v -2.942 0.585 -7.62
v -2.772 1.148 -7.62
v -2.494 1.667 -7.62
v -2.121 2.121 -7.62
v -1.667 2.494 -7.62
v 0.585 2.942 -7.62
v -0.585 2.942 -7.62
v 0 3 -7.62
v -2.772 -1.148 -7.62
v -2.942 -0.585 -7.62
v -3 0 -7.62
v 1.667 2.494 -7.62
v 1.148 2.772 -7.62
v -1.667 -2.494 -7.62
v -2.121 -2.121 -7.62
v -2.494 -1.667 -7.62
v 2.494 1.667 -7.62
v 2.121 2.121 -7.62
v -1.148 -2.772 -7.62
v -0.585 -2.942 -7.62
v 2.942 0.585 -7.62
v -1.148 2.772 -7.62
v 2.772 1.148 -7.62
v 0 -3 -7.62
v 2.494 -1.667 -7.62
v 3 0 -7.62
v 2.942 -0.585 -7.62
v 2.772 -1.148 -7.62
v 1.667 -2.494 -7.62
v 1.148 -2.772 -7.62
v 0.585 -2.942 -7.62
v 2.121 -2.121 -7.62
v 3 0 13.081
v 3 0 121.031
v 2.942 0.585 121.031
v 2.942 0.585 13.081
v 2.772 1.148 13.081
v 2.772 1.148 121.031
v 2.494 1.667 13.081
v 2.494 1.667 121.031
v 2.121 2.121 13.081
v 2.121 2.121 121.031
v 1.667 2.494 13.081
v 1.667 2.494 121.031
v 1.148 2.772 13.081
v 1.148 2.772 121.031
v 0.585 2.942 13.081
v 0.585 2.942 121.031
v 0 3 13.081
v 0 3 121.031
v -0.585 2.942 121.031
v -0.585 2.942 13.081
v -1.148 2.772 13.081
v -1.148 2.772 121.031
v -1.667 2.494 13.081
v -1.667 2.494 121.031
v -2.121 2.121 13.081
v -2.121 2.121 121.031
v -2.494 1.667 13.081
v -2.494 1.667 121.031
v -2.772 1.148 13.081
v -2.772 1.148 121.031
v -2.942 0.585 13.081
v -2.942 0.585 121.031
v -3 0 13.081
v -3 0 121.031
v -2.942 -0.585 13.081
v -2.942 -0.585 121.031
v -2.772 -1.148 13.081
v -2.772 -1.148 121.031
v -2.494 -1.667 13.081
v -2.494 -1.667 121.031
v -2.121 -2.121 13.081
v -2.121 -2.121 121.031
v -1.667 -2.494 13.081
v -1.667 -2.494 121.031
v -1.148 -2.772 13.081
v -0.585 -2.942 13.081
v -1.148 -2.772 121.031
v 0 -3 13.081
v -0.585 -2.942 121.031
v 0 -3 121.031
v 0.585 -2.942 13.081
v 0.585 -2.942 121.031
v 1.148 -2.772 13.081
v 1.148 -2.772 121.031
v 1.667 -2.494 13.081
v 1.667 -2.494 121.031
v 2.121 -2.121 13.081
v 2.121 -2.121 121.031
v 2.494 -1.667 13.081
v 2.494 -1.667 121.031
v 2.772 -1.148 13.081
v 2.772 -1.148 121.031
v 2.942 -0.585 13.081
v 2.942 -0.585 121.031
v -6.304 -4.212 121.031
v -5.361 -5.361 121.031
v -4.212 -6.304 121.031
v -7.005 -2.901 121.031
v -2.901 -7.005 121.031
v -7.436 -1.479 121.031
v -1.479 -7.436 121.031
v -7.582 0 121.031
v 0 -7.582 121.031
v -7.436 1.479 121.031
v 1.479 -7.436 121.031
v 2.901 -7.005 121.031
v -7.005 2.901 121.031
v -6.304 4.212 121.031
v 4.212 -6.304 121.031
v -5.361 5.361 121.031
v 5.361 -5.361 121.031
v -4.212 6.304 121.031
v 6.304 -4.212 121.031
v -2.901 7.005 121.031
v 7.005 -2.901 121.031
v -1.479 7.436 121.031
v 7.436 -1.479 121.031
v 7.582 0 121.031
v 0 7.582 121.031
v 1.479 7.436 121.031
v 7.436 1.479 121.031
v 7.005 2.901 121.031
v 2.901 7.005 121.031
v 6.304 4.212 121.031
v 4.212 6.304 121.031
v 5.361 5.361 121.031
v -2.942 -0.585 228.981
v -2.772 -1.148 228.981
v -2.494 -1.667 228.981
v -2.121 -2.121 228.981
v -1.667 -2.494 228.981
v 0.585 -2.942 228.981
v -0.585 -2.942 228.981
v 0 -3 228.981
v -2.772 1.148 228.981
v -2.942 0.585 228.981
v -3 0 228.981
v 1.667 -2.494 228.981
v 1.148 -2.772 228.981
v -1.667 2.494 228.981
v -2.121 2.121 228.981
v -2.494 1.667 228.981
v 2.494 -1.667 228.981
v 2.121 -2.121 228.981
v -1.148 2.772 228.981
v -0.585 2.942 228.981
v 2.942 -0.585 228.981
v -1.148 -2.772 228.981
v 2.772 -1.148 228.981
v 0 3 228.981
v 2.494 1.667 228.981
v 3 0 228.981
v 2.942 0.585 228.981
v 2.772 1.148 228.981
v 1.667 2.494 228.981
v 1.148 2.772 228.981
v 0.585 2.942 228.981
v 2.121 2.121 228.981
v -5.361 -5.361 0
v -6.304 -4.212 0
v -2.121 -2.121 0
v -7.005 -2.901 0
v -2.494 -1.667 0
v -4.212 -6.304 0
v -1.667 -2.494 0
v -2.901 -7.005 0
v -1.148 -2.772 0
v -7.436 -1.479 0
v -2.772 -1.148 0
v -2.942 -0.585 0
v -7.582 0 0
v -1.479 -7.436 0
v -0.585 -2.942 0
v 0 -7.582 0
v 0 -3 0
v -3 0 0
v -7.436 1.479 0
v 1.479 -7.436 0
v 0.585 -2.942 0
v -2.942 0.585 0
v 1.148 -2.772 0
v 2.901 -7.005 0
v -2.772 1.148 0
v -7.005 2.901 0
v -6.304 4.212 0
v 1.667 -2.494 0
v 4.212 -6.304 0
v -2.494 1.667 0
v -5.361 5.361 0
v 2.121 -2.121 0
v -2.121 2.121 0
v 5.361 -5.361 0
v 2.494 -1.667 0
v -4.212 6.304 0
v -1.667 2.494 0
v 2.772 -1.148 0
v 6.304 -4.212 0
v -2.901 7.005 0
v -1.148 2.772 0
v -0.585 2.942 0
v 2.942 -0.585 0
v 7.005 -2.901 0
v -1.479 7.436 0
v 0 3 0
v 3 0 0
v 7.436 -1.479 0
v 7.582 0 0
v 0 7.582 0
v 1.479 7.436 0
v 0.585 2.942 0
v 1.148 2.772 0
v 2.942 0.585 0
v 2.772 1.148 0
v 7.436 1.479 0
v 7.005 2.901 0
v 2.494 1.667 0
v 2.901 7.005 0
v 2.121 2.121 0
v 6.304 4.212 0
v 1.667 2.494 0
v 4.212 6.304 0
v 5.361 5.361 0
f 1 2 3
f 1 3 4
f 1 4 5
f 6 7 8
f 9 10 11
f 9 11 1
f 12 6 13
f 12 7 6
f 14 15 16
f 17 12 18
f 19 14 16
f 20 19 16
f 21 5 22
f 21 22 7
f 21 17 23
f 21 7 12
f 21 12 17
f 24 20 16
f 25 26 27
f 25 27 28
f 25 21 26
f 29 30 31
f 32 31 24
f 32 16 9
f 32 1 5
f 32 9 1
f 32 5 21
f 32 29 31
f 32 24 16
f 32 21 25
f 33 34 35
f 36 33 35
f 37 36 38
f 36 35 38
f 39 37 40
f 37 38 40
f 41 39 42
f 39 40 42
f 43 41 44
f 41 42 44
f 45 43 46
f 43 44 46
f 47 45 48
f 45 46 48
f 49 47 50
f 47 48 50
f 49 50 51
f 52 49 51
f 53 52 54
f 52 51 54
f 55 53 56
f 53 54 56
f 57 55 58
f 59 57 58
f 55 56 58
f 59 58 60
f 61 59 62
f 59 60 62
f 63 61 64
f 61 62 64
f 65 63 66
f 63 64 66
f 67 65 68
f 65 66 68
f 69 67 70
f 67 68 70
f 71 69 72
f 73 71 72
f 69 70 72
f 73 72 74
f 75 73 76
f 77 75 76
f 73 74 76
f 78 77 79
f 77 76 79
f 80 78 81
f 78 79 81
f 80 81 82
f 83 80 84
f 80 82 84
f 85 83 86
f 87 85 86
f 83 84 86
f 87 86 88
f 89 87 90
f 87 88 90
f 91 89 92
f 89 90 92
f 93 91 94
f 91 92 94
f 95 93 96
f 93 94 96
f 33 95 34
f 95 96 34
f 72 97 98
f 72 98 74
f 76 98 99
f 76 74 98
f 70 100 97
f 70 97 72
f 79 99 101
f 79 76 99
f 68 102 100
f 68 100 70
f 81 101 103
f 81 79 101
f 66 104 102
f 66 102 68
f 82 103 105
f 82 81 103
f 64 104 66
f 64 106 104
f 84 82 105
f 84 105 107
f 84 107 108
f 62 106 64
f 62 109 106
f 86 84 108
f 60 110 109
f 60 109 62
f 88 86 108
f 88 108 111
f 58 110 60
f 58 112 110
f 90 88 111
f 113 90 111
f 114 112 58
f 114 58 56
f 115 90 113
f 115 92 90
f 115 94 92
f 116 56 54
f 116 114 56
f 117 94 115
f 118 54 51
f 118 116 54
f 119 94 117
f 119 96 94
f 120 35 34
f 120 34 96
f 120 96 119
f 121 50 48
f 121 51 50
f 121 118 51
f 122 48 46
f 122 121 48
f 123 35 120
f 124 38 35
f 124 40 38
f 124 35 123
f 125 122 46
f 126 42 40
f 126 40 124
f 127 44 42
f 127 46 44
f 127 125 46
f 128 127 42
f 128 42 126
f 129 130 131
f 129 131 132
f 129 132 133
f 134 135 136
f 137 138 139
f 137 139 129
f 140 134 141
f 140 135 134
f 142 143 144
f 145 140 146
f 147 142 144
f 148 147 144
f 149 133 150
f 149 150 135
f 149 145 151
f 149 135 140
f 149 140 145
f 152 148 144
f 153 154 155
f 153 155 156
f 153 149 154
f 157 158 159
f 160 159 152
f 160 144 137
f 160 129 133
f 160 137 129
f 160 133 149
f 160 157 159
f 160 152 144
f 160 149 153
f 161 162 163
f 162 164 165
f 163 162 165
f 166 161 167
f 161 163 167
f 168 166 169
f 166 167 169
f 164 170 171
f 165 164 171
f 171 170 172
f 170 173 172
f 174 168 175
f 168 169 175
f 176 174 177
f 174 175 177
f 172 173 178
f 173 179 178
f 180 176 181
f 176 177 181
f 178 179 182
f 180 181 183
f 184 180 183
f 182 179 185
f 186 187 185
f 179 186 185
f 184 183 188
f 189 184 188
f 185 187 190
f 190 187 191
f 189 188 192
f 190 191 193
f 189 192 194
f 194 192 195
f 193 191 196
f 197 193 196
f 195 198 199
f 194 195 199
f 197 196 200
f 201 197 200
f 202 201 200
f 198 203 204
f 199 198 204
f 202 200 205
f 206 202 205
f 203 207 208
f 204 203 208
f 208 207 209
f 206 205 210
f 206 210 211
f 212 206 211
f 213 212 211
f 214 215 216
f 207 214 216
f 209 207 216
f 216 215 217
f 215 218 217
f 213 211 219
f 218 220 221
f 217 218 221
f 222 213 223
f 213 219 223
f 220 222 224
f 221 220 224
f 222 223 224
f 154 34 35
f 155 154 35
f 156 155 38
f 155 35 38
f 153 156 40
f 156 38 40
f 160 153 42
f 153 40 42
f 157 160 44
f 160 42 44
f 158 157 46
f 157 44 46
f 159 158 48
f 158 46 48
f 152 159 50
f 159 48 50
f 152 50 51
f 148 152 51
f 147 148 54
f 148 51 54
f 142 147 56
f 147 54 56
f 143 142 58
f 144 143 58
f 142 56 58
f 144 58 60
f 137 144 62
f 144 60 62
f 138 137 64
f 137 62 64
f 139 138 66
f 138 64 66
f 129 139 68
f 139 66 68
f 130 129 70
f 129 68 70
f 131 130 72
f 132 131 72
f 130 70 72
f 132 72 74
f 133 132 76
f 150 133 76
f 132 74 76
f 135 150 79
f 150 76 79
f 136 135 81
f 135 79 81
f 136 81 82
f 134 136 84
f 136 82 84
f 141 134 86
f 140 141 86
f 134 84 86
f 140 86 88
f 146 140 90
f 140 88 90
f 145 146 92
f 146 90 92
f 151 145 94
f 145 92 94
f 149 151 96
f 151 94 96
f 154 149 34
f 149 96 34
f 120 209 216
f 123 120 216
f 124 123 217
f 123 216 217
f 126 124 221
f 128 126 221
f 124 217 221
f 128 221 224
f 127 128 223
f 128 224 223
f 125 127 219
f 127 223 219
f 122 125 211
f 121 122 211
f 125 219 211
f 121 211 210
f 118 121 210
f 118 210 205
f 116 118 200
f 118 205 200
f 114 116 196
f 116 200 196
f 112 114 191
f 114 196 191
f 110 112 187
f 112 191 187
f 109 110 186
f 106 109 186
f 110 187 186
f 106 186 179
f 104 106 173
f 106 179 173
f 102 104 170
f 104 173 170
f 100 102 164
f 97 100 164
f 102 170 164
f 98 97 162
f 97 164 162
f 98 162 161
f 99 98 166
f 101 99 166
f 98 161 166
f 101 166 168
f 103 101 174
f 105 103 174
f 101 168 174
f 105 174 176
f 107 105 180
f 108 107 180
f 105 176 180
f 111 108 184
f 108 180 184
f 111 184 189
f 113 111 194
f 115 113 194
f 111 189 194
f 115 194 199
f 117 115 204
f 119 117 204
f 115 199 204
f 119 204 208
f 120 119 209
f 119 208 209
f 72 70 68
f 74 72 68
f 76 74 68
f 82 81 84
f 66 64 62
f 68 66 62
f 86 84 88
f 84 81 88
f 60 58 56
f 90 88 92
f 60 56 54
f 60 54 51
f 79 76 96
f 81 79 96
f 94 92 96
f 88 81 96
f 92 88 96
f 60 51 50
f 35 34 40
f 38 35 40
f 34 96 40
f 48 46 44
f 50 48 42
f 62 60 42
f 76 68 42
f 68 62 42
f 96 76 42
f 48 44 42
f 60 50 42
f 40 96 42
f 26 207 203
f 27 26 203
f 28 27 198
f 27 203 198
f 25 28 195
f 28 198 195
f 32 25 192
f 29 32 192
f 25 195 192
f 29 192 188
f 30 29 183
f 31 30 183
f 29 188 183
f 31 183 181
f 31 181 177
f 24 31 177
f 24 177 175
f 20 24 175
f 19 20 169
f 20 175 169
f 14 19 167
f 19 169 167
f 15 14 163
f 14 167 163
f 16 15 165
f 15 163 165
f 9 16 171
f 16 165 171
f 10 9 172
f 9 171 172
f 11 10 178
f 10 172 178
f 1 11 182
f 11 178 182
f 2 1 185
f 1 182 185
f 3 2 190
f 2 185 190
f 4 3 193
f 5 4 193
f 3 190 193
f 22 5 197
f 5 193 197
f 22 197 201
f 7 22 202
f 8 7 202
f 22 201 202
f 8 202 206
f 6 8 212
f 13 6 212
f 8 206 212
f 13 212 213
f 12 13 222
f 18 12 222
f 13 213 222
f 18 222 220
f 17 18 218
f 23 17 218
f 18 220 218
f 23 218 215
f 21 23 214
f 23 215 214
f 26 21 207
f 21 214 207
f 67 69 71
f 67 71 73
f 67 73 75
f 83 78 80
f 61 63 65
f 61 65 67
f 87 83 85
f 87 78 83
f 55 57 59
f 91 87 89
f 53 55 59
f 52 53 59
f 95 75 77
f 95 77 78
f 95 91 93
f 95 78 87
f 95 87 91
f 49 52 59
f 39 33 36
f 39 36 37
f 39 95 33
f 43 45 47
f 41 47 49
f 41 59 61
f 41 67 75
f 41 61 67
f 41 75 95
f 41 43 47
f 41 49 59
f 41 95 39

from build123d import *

# Parameters (mm, degrees)
F0_R     = 7.5819
F1_DEPTH = 121.031
F2_R     = 3
F3_DEPTH = 7.62
F4_R     = 3
F5_DEPTH = 107.95
F6_DEPTH = 107.95


with BuildPart() as f1:
    # F0 (on Top) → F1 (new body)
    with BuildSketch(Plane.XY):
        Circle(F0_R)
    extrude(amount=F1_DEPTH)

    # F2 (on face) → F3 (join)
    with BuildSketch(Plane(origin=(0, 0, 0), x_dir=(1, 0, 0), z_dir=(0, 0, -1))):
        Circle(F2_R)
    extrude(amount=F3_DEPTH)

    # F4 (on face) → F5 (cut)
    with BuildSketch(Plane.XY.offset(121.031)):
        Circle(F4_R)
    extrude(amount=-F5_DEPTH, mode=Mode.SUBTRACT)


with BuildPart() as f6:
    # F4 (on face) → F6 (new body)
    with BuildSketch(Plane.XY.offset(121.031)):
        Circle(F4_R)
    extrude(amount=F6_DEPTH)


solid = Compound([f1.part, f6.part])
